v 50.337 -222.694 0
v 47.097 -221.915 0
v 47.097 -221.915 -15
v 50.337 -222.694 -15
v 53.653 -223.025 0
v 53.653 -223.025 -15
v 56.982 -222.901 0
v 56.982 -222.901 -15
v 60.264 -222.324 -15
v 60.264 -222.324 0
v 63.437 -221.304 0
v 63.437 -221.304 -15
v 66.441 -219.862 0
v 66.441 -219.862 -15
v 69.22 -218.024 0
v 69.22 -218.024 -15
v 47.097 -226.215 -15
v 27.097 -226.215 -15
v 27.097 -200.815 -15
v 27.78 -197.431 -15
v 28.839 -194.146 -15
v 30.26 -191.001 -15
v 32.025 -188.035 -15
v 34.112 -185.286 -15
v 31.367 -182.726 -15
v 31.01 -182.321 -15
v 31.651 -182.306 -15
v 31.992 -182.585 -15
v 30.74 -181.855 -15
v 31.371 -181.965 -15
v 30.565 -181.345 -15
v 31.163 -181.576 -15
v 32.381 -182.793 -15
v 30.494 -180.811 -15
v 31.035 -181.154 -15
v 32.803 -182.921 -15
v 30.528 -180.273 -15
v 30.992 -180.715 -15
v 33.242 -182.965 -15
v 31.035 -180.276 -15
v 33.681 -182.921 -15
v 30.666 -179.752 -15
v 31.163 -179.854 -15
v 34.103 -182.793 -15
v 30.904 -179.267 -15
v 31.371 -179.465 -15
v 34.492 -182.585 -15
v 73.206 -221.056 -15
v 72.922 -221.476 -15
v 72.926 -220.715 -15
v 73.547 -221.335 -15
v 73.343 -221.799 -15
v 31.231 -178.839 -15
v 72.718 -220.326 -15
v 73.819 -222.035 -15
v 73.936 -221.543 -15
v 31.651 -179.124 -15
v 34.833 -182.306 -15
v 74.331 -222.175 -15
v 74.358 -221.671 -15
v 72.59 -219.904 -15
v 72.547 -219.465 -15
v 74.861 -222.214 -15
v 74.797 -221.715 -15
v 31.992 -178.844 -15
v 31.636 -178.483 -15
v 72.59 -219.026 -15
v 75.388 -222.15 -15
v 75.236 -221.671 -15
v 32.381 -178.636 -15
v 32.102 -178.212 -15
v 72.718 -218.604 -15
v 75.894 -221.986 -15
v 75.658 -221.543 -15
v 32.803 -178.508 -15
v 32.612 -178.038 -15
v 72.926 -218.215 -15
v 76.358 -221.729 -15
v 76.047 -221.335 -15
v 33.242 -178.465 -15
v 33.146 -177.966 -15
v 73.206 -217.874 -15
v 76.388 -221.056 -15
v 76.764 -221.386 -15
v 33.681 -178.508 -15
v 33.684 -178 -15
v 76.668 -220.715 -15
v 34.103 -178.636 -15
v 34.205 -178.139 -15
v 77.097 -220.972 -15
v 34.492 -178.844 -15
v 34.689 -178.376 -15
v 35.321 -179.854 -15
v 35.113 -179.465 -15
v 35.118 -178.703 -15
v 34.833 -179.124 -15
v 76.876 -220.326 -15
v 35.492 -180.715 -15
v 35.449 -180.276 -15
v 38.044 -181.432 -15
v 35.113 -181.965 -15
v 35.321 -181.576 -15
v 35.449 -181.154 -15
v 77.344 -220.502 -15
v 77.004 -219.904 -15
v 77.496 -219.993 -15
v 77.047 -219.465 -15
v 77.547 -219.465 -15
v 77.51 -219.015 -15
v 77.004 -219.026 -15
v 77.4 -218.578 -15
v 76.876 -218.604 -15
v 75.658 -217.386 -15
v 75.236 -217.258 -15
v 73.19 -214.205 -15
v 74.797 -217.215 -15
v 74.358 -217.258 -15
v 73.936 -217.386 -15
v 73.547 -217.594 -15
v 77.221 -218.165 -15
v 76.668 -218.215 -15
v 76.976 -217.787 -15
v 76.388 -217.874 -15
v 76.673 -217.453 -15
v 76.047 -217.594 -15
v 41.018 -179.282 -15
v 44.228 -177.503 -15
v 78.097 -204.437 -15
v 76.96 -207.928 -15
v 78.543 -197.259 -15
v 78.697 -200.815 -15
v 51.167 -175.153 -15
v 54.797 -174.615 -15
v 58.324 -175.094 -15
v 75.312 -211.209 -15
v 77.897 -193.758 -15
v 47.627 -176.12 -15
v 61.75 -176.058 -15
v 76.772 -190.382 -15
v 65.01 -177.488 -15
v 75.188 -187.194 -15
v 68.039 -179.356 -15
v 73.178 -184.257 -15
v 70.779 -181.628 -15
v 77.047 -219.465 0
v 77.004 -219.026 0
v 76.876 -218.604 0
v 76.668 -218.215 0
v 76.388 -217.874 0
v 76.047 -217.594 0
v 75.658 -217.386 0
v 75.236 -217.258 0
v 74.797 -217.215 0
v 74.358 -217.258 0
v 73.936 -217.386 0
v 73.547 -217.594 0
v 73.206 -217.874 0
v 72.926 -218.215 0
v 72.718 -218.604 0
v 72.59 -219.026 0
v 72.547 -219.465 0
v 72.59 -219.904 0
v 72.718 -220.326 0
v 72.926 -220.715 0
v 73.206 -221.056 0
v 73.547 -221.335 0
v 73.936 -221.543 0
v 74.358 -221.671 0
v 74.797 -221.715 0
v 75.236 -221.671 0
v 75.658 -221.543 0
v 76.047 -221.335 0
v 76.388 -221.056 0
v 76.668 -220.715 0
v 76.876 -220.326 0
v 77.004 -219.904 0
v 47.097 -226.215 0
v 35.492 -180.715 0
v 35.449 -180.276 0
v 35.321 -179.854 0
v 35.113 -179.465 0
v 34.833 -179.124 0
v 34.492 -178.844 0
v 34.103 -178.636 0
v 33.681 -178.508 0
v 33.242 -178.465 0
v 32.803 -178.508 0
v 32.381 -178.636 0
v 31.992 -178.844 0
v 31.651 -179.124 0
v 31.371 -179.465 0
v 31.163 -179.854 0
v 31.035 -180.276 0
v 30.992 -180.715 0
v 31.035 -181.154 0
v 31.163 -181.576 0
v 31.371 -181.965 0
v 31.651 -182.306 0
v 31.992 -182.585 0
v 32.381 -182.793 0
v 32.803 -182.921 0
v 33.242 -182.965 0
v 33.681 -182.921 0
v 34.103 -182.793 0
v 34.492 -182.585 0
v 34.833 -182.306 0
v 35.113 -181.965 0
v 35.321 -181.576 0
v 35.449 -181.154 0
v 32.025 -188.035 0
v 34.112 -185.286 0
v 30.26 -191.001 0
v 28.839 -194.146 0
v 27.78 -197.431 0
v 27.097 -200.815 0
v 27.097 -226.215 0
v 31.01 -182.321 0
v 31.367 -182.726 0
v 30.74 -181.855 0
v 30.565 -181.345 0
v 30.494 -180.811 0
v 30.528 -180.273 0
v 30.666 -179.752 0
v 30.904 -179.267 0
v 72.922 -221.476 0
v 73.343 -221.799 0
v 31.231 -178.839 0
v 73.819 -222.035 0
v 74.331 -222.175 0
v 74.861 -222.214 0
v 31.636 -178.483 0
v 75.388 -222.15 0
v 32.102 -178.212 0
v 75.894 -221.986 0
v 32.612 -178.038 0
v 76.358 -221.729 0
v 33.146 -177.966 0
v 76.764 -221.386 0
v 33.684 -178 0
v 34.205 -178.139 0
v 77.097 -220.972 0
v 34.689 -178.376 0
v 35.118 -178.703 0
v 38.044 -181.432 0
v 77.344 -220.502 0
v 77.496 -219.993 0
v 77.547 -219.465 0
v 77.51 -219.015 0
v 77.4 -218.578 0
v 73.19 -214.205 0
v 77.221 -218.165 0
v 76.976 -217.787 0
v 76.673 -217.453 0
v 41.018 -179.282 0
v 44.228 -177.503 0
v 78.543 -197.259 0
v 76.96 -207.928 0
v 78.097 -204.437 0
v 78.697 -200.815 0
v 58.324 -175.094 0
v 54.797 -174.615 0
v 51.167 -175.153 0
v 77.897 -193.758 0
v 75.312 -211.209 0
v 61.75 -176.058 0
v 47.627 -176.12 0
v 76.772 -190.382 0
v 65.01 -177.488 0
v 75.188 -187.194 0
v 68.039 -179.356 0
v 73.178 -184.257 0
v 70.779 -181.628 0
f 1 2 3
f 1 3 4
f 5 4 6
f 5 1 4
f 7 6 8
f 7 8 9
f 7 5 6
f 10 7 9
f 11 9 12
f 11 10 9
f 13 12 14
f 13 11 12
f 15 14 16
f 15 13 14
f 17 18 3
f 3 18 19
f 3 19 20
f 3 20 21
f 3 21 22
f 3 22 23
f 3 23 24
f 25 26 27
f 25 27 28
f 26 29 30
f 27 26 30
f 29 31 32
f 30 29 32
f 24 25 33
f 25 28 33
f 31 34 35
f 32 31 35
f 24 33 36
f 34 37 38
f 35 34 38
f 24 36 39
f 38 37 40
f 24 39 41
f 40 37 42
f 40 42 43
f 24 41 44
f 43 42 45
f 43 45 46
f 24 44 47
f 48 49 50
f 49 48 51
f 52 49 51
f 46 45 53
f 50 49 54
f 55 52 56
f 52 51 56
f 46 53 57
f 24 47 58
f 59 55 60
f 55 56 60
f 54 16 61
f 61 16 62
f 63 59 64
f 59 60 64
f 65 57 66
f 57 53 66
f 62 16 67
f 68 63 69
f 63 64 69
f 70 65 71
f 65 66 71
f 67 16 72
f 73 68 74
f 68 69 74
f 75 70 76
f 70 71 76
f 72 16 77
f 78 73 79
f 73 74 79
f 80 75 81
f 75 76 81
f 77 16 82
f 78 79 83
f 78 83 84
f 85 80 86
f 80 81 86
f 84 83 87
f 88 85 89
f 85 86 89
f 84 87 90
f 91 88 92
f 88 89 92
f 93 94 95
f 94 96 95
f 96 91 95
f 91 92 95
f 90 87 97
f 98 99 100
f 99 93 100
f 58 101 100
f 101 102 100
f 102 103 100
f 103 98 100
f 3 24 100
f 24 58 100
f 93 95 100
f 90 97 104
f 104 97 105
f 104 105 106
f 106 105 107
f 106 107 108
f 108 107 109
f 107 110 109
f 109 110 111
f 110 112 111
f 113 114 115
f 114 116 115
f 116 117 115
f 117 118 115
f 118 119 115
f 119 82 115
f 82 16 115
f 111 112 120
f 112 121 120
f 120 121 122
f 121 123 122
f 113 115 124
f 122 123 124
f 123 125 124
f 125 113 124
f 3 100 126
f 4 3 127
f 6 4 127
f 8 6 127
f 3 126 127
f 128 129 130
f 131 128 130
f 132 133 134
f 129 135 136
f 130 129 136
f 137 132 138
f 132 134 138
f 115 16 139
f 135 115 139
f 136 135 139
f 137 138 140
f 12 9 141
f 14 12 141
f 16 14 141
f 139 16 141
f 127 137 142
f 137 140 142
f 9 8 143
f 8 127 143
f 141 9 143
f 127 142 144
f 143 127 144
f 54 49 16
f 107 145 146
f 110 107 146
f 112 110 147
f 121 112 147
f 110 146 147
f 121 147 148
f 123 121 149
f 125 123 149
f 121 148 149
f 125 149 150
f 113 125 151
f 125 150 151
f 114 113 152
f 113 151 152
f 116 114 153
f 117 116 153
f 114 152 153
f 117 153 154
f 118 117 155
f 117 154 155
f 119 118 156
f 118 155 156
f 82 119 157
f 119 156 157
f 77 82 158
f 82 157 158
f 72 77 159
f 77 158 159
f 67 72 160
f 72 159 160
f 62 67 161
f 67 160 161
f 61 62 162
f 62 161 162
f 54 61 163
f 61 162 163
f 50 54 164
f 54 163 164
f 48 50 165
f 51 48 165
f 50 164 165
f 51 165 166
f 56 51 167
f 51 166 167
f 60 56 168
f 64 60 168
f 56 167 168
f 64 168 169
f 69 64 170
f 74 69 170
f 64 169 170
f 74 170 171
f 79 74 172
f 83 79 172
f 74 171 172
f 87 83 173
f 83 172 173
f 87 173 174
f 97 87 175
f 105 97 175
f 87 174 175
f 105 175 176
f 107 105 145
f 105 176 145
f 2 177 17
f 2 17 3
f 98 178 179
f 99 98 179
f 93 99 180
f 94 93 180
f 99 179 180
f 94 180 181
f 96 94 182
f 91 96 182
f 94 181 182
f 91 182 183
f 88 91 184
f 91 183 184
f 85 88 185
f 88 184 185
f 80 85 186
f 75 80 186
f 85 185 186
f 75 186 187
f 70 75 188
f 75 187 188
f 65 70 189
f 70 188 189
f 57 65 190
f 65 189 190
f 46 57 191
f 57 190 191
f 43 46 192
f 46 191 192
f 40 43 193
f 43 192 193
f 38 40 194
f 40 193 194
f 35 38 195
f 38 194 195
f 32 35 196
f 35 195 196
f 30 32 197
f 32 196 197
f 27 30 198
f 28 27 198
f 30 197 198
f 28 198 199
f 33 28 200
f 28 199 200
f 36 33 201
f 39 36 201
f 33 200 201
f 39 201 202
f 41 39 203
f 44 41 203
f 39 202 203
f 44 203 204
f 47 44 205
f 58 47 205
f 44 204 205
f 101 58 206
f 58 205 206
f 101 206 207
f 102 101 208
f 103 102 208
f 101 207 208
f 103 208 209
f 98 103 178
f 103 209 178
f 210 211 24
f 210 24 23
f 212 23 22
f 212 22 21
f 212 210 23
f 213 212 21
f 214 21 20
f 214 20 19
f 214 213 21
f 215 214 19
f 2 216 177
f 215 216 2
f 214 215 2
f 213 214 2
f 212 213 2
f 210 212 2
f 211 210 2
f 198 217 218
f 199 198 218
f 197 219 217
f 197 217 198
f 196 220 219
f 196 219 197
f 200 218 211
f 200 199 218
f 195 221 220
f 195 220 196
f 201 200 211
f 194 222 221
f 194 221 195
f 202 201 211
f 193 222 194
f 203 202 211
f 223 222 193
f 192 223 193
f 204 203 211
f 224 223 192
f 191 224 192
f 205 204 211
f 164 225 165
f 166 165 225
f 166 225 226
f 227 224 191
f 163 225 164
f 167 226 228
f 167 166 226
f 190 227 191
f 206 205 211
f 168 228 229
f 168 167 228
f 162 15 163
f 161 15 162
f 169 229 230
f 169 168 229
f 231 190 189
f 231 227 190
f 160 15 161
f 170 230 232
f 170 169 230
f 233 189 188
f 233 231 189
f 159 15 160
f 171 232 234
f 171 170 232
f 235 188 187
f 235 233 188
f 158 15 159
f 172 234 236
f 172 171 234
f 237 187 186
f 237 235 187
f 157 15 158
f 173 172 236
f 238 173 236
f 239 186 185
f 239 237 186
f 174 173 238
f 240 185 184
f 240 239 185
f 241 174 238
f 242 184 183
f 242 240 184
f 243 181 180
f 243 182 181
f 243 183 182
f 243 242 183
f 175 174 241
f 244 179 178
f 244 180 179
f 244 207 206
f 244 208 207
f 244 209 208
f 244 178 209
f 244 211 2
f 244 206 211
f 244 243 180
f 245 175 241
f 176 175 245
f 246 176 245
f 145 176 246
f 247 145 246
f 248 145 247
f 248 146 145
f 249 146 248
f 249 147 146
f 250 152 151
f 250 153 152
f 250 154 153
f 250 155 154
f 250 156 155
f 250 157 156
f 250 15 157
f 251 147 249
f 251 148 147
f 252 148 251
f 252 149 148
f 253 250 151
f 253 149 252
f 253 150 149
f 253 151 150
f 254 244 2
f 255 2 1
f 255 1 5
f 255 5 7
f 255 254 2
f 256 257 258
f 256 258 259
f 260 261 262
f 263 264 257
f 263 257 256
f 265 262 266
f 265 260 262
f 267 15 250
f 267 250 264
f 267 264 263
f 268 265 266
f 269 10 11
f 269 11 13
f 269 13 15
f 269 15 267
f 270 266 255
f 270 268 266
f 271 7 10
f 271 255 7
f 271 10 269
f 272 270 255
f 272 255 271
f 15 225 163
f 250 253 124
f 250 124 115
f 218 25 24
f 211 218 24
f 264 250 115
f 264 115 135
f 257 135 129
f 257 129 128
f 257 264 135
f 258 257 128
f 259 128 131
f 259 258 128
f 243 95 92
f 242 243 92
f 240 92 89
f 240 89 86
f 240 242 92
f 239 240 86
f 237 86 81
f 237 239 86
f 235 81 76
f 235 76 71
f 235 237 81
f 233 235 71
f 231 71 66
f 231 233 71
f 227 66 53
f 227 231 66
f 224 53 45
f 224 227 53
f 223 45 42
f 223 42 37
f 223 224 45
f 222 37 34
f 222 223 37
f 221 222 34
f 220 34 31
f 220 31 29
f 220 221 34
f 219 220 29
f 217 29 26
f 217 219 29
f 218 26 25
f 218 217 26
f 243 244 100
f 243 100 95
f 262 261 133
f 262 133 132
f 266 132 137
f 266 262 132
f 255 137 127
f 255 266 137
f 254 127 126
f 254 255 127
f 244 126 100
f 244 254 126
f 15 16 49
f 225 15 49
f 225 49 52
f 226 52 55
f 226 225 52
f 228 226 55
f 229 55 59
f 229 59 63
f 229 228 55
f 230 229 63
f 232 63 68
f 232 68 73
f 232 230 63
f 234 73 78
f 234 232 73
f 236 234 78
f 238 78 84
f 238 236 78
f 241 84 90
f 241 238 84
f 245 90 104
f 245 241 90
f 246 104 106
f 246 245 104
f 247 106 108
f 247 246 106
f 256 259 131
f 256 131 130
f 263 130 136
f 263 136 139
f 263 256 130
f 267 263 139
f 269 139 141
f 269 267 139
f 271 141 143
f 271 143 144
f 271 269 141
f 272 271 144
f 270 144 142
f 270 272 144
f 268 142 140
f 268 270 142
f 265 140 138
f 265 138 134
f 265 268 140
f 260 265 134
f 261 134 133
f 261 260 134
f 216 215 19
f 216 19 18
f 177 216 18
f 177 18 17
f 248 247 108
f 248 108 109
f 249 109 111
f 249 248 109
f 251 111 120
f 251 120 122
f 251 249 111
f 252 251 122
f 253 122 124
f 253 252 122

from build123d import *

# Parameters (mm, degrees)
F0_R     = 2.25
F1_DEPTH = 15


with BuildPart() as f1:
    # F0 (on Top) → F1 (new body)
    with BuildSketch(Plane.XY):
        with BuildLine():
            Line((31.366729, -182.725793), (34.111926, -185.285689))
            ThreePointArc((34.111926, -185.285689), (35.991225, -183.270417), (38.043709, -181.431833))
            Line((38.043709, -181.431833), (35.117688, -178.703318))
            ThreePointArc((35.117688, -178.703318), (35.764119, -179.617985), (35.992209, -180.714555))
            ThreePointArc((35.992209, -180.714555), (34.338779, -183.236466), (31.366729, -182.725793))
        make_face()
        with BuildLine():
            Line((27.097168, -200.814555), (27.097168, -226.214555))
            Line((27.097168, -226.214555), (47.097168, -226.214555))
            Line((47.097168, -226.214555), (47.097168, -221.914555))
            ThreePointArc((47.097168, -221.914555), (58.633169, -222.668244), (69.219767, -218.023751))
            ThreePointArc((69.219767, -218.023751), (71.312849, -216.22702), (73.189601, -214.205377))
            ThreePointArc((73.189601, -214.205377), (76.96026, -207.928201), (78.697168, -200.814555))
            ThreePointArc((78.697168, -200.814555), (72.02437, -182.90062), (54.797168, -174.614555))
            ThreePointArc((54.797168, -174.614555), (45.906812, -176.760956), (38.043709, -181.431833))
            ThreePointArc((38.043709, -181.431833), (35.991225, -183.270417), (34.111926, -185.285689))
            ThreePointArc((34.111926, -185.285689), (29.505205, -192.553523), (27.097168, -200.814555))
        make_face()
        with BuildLine():
            ThreePointArc((35.117688, -178.703318), (31.230971, -178.839076), (31.366729, -182.725793))
            ThreePointArc((31.366729, -182.725793), (34.338779, -183.236466), (35.992209, -180.714555))
            ThreePointArc((35.992209, -180.714555), (35.764119, -179.617985), (35.117688, -178.703318))
        make_face()
        with Locations((33.242209, -180.714555)):
            Circle(F0_R, mode=Mode.SUBTRACT)
        with BuildLine():
            ThreePointArc((73.189601, -214.205377), (71.312849, -216.22702), (69.219767, -218.023751))
            Line((69.219767, -218.023751), (72.921689, -221.475793))
            ThreePointArc((72.921689, -221.475793), (72.785931, -217.589076), (76.672648, -217.453318))
            Line((76.672648, -217.453318), (73.189601, -214.205377))
        make_face()
        with BuildLine():
            ThreePointArc((76.672648, -217.453318), (72.785931, -217.589076), (72.921689, -221.475793))
            ThreePointArc((72.921689, -221.475793), (75.893738, -221.986466), (77.547168, -219.464555))
            ThreePointArc((77.547168, -219.464555), (77.319079, -218.367985), (76.672648, -217.453318))
        make_face()
        with Locations((74.797168, -219.464555)):
            Circle(F0_R, mode=Mode.SUBTRACT)
    extrude(amount=-F1_DEPTH)


solid = f1.part
